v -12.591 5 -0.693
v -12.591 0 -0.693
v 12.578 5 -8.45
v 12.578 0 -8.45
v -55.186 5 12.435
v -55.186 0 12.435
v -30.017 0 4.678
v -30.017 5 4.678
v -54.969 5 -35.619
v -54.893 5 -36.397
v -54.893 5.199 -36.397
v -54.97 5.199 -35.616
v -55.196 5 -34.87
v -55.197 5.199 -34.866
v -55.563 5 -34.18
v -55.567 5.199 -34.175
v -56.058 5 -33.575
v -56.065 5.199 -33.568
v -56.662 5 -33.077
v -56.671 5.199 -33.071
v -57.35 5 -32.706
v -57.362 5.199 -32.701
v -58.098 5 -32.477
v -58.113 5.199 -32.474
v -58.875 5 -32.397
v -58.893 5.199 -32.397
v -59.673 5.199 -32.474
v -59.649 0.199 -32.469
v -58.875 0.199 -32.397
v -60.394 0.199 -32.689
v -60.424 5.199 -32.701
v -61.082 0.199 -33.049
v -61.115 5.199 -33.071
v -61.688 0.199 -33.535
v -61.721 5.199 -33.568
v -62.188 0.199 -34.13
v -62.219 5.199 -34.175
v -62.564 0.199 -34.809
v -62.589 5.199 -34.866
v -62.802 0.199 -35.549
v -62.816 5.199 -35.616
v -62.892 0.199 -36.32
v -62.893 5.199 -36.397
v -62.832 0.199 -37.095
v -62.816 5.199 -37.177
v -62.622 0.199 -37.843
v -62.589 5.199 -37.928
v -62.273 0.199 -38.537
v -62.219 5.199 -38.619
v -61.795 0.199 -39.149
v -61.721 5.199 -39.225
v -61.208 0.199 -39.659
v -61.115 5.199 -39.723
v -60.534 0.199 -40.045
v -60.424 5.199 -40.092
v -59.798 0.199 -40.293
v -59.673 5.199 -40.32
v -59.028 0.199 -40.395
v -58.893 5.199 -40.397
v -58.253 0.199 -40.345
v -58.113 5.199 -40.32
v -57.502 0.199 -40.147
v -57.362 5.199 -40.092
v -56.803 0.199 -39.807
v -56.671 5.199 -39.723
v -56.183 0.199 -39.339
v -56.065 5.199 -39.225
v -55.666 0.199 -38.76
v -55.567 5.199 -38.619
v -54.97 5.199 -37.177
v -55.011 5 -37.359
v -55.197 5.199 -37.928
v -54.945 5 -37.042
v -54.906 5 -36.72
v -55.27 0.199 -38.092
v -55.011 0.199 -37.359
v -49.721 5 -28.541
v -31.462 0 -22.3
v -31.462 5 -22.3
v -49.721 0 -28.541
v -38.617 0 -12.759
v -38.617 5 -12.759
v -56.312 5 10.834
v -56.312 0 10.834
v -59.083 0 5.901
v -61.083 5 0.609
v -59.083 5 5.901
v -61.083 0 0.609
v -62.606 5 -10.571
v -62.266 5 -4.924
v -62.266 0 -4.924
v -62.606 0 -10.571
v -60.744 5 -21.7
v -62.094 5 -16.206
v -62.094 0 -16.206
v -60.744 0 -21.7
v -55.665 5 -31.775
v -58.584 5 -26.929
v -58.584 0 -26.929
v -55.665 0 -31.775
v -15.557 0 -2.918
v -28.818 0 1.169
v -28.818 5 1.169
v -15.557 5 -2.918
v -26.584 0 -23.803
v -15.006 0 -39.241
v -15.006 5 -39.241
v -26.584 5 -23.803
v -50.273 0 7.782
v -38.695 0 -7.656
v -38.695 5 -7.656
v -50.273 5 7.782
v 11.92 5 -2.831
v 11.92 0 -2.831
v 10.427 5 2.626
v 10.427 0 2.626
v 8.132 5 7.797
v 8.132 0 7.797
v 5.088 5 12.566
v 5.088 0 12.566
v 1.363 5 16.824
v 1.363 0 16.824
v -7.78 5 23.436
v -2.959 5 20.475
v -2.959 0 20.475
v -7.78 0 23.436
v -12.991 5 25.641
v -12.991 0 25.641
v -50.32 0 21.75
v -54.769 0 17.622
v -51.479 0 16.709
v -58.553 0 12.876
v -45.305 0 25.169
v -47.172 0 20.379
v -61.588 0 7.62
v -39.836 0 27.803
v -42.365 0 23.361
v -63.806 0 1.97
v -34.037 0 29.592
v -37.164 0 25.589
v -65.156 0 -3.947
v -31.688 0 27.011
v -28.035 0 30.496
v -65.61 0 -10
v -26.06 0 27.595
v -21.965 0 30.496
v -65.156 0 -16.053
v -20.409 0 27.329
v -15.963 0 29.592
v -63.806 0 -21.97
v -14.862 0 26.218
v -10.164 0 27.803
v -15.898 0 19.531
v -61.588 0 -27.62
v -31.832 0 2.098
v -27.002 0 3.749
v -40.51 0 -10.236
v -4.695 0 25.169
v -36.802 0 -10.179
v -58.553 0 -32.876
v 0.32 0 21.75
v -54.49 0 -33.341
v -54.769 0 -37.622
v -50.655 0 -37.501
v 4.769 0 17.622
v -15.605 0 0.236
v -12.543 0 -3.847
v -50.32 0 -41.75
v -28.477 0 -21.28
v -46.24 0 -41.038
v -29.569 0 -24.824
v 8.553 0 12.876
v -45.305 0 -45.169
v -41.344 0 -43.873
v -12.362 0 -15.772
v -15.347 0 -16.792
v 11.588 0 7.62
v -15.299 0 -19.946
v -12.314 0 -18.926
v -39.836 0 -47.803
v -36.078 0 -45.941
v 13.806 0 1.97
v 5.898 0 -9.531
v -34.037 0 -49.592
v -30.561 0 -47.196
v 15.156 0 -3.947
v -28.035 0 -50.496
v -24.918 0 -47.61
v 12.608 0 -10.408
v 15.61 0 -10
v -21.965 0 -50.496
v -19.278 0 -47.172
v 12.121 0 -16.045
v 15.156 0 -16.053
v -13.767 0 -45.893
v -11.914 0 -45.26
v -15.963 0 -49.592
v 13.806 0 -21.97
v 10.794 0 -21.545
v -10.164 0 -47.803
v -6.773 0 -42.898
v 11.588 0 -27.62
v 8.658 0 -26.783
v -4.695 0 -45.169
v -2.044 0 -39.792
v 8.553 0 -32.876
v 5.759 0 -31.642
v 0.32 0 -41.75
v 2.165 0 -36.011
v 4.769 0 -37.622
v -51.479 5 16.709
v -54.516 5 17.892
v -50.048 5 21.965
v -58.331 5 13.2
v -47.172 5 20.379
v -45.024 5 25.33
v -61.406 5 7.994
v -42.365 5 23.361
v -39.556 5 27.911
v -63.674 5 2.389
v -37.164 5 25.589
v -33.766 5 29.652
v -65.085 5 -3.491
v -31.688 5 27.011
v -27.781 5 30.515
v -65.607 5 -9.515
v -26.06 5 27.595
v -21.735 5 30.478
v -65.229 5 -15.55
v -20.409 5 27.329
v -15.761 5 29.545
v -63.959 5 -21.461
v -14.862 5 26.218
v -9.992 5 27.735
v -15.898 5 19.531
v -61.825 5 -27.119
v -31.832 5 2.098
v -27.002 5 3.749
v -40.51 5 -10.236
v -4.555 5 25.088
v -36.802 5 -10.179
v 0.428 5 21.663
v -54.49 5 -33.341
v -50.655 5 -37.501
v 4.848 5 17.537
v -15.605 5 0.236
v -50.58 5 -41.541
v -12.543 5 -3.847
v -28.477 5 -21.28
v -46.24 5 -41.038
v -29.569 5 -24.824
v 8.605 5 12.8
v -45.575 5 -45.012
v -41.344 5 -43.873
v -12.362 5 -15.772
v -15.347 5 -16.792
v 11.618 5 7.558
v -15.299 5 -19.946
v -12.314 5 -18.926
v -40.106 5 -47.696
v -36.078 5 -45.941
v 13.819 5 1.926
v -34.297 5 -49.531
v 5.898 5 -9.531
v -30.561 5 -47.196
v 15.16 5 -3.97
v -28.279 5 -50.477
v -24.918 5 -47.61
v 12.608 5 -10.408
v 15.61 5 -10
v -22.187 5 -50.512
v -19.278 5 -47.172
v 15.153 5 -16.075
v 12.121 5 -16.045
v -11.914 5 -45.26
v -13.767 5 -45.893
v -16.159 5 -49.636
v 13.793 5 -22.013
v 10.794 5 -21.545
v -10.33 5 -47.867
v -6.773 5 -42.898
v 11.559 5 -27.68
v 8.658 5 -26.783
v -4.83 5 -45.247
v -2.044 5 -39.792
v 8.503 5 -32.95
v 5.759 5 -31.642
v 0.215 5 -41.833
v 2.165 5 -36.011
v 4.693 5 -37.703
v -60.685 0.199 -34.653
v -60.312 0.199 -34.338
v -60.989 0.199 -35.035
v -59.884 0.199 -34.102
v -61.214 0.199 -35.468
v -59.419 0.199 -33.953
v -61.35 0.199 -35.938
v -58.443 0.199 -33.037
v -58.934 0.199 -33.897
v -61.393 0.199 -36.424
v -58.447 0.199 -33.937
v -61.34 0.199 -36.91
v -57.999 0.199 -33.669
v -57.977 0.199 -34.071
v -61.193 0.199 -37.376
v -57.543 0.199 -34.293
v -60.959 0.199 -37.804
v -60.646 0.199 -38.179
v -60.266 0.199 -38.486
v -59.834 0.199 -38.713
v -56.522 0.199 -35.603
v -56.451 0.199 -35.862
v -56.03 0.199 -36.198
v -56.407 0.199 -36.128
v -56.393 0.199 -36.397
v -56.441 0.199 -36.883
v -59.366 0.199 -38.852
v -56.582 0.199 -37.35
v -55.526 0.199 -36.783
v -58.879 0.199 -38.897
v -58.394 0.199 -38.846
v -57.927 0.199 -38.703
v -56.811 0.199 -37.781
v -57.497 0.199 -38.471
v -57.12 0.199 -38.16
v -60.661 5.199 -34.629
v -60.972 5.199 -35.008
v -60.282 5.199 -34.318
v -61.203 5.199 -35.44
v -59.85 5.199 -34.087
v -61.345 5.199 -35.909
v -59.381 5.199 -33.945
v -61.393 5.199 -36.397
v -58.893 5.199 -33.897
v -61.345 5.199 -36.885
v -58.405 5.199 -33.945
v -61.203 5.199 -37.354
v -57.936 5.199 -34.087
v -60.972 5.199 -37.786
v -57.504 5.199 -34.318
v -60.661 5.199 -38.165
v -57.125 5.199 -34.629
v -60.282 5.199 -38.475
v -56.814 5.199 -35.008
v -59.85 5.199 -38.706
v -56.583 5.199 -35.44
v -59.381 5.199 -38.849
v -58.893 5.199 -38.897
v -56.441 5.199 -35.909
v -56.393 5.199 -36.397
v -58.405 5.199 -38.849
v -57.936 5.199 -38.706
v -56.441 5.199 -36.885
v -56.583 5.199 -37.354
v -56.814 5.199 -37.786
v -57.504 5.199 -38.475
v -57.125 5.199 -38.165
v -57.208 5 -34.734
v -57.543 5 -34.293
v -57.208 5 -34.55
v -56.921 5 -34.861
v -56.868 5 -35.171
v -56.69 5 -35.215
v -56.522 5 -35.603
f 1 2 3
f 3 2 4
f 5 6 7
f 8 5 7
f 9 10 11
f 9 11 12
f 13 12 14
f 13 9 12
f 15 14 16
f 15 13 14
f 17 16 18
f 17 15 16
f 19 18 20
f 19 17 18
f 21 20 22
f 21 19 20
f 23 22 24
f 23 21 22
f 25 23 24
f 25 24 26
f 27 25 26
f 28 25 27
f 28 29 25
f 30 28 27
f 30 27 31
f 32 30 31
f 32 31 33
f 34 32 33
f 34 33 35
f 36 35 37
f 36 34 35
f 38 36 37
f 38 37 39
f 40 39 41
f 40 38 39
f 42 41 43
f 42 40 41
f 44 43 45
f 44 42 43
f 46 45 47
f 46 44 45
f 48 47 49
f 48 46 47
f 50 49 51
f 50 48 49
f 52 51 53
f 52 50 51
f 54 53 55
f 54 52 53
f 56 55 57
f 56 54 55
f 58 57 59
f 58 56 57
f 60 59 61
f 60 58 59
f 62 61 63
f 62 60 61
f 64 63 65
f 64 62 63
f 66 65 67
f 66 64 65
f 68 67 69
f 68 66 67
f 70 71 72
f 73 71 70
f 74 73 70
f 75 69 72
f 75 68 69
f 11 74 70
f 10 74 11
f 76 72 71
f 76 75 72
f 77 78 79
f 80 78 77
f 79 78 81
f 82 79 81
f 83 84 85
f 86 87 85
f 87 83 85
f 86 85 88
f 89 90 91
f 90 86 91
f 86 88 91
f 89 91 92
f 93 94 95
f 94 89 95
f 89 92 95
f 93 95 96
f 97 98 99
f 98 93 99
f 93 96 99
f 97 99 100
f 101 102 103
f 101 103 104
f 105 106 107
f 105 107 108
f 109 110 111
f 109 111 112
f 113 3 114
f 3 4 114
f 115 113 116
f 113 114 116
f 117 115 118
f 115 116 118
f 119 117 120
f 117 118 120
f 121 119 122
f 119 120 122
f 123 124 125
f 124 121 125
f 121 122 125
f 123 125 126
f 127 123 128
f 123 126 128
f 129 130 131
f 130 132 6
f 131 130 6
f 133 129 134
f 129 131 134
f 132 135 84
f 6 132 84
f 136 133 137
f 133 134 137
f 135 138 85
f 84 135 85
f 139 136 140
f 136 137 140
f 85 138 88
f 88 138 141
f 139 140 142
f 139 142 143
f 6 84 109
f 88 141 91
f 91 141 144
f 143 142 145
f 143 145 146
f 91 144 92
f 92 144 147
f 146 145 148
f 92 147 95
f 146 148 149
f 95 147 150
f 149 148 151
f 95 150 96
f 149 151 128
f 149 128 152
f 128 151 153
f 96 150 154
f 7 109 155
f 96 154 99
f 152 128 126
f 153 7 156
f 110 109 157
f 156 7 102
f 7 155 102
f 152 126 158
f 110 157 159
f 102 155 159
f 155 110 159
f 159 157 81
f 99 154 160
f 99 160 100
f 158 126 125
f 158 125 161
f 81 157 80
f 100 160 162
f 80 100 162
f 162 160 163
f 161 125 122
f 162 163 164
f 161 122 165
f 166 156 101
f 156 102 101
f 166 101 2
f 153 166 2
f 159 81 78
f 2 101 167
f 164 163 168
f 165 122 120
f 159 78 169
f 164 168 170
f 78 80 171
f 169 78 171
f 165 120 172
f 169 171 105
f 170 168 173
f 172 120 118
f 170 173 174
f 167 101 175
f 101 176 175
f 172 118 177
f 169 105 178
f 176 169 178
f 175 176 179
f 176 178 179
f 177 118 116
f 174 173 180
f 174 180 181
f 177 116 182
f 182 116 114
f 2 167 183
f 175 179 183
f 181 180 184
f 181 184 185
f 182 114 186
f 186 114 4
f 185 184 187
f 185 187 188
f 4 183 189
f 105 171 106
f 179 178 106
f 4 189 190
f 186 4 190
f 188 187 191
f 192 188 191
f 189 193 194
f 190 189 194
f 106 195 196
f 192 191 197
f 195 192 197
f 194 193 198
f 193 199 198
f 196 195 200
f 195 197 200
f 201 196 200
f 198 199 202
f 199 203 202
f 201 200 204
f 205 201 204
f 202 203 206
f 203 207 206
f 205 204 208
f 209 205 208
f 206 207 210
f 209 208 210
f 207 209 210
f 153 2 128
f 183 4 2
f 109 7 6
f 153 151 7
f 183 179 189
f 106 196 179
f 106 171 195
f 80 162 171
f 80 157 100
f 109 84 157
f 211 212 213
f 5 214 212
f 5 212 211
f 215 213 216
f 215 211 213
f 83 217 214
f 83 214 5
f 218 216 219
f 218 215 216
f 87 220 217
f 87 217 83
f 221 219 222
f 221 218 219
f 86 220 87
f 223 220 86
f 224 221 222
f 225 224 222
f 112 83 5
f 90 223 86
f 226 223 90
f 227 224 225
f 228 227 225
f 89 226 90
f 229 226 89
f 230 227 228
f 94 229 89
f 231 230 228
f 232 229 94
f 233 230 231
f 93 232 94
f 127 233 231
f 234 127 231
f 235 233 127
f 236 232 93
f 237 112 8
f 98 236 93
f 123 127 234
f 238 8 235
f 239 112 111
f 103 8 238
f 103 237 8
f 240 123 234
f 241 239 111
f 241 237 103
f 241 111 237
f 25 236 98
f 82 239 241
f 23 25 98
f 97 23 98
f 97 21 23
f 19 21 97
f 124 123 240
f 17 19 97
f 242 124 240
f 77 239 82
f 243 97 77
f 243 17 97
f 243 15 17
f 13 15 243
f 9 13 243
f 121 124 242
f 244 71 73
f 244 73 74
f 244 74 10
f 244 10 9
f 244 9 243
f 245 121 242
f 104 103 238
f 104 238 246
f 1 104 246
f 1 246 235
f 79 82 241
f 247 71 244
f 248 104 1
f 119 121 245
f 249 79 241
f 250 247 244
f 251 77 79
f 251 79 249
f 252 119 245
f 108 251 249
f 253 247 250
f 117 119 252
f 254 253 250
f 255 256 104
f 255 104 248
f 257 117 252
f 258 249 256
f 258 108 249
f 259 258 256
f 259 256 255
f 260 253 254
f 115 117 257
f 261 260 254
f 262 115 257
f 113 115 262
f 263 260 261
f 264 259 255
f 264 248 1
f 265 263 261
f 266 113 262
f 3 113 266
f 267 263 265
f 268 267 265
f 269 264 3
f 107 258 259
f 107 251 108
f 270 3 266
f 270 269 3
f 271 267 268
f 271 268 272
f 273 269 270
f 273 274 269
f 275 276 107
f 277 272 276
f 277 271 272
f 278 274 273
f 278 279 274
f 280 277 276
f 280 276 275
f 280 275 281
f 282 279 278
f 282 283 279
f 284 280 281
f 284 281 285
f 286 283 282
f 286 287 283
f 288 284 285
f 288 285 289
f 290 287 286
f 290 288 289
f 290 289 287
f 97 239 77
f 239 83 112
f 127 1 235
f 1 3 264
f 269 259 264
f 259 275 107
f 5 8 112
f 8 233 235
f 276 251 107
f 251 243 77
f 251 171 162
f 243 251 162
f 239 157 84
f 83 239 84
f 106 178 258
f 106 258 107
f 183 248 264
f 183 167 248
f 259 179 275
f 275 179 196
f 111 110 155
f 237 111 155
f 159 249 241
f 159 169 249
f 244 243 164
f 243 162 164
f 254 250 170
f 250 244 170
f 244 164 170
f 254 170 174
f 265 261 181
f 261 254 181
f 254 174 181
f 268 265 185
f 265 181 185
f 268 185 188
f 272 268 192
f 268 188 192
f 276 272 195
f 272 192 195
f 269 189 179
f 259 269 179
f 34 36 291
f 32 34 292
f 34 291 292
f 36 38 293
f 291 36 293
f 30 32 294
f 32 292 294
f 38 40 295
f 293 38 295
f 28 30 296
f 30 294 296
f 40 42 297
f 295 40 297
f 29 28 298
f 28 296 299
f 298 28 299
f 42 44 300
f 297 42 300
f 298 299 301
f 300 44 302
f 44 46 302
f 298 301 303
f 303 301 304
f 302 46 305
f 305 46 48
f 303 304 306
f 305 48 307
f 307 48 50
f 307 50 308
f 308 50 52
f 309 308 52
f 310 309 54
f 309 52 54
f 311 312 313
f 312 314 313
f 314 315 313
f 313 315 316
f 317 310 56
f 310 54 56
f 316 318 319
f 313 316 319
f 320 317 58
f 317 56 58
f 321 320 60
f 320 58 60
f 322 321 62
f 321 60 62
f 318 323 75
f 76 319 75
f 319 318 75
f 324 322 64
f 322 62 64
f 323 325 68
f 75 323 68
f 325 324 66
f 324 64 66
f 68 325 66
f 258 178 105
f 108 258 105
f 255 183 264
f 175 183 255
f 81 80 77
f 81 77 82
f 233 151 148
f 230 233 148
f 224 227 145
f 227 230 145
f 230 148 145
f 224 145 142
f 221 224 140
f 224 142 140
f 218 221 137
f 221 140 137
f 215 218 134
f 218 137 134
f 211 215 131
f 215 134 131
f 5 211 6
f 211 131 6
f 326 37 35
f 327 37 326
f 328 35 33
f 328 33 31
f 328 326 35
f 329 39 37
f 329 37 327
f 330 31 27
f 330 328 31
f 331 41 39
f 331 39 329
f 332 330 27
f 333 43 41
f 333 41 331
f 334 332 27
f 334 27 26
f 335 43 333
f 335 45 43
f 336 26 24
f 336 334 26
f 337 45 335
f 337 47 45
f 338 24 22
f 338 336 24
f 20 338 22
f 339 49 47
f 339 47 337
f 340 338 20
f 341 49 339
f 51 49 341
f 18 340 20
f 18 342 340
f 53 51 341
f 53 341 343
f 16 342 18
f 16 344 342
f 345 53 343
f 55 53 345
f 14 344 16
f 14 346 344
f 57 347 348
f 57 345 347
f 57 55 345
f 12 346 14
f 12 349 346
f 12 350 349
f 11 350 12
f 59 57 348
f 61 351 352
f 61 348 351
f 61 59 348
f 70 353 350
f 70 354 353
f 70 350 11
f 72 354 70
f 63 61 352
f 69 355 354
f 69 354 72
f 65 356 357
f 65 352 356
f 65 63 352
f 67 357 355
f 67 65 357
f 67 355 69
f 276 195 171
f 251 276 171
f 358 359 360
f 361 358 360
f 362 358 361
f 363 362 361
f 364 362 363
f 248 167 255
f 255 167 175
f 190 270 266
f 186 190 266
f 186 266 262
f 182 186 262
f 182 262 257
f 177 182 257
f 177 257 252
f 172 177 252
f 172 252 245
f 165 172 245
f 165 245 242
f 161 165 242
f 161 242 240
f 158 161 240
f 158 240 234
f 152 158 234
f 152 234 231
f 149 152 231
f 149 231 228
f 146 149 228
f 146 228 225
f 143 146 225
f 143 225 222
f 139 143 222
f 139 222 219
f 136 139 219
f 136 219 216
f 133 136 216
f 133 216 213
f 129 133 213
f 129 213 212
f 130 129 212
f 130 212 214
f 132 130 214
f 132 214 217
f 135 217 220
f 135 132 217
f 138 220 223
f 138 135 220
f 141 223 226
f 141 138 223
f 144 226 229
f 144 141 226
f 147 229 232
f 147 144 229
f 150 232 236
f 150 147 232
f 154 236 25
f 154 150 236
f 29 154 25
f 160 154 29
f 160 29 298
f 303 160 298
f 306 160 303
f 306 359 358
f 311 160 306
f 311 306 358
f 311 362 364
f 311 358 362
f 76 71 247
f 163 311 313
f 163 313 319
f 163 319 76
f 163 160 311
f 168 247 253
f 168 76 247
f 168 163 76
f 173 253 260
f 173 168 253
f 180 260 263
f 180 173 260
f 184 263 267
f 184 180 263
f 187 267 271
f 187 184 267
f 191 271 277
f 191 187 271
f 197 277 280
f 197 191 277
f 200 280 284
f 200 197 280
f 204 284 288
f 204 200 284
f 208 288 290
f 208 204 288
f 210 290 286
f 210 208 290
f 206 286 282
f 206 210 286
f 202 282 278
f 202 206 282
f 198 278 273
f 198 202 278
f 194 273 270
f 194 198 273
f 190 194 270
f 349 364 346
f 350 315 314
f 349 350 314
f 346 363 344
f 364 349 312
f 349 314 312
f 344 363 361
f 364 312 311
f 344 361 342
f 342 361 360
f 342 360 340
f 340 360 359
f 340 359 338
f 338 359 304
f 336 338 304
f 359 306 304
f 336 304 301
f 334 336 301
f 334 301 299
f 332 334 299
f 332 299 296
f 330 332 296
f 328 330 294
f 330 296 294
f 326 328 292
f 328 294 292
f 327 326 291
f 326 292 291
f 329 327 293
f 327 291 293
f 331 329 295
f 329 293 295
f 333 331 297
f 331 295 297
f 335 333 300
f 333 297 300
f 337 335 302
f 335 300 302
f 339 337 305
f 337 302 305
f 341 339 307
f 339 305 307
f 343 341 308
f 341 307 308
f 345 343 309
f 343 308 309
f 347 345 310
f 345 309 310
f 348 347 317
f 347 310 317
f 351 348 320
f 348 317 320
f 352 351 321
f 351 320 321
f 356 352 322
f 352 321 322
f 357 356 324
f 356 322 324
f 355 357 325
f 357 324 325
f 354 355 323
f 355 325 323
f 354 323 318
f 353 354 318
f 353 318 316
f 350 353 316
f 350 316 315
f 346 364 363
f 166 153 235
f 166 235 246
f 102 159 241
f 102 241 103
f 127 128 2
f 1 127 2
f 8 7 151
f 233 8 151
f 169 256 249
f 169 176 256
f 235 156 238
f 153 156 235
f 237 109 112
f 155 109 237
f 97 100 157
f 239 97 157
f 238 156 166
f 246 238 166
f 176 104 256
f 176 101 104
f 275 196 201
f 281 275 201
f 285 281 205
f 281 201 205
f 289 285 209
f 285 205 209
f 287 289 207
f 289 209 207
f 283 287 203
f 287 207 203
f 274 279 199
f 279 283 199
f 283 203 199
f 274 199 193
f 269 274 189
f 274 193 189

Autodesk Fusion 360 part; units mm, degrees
sketch "草图1" plane through (0, 0, 0) normal (0, 1, 0) x (1, 0, 0)
  point P0 (-25, 10)
sketch "草图2" plane through (0, 0, 0) normal (0, 1, 0) x (1, 0, 0)
  circle A0 centre (-25, 10) radius 40.6099
  line L0 (-13.7666, 45.8931) -> (-29.5688, 24.8235)
  line L1 (-15.0058, 39.2409) -> (-26.584, 23.8033)
  line L2 (-29.5688, 24.8235) -> (-54.4904, 33.3414)
  line L3 (-31.4615, 22.3) -> (-49.7214, 28.541)
  line L4 (-49.7214, 28.541) -> (-38.6172, 12.759)
  line L5 (-31.4615, 22.3) -> (-38.6172, 12.759)
  line L6 (-40.5098, 10.2355) -> (-56.312, -10.8341)
  line L7 (-55.6651, 31.7752) -> (-40.5098, 10.2355)
  line L8 (-28.4766, 21.2798) -> (-36.802, 10.1792)
  line L9 (-38.6947, 7.6557) -> (-50.2729, -7.7819)
  line L10 (-50.2729, -7.7819) -> (-31.8319, -2.0981)
  line L11 (-38.6947, 7.6557) -> (-31.8319, -2.0981)
  line L12 (-30.0168, -4.6779) -> (-14.8615, -26.2176)
  line L13 (-55.1855, -12.4353) -> (-30.0168, -4.6779)
  line L14 (-36.802, 10.1792) -> (-28.8175, -1.169)
  line L15 (-27.0023, -3.7488) -> (-15.8981, -19.5309)
  line L16 (-15.8981, -19.5309) -> (-15.6052, -0.2361)
  line L17 (-28.8175, -1.169) -> (-15.5573, 2.918)
  line L18 (-12.5428, 3.8471) -> (5.8981, 9.5309)
  line L19 (-12.9906, -25.641) -> (-12.5907, 0.693)
  line L20 (-27.0023, -3.7488) -> (-15.6052, -0.2361)
  line L21 (-12.5907, 0.693) -> (12.578, 8.4504)
  line L22 (5.8981, 9.5309) -> (-12.3618, 15.7719)
  line L23 (-15.3466, 16.7921) -> (-28.4766, 21.2798)
  line L24 (12.6077, 10.408) -> (-12.3139, 18.9259)
  line L25 (-15.2987, 19.9461) -> (-26.584, 23.8033)
  line L26 (-15.5573, 2.918) -> (-15.3466, 16.7921)
  line L27 (-15.2987, 19.9461) -> (-15.0058, 39.2409)
  line L28 (-12.5428, 3.8471) -> (-12.3618, 15.7719)
  line L29 (-12.3139, 18.9259) -> (-11.914, 45.2599)
  arc A1 (-13.7666, 45.8931) -> (-54.4904, 33.3414) centre (-25, 10) ccw
  arc A2 (-55.6651, 31.7752) -> (-56.312, -10.8341) centre (-25, 10) ccw
  arc A3 (-55.1855, -12.4353) -> (-14.8615, -26.2176) centre (-25, 10) ccw
  arc A4 (-12.9906, -25.641) -> (12.578, 8.4504) centre (-25, 10) ccw
  arc A5 (12.6077, 10.408) -> (-11.914, 45.2599) centre (-25, 10) ccw
  point P0 (-15.0058, 39.2409)
  point P1 (-50.2729, -7.7819)
  point P2 (5.8981, 9.5309)
  point P3 (-49.7214, 28.541)
  point P4 (-25, 10)
extrude "拉伸1" add sketch "草图2" along normal blind 5 makes body 1
sketch "草图3" plane through (0, 0, 0) normal (0, 1, 0) x (1, 0, 0)
sketch "草图4" plane through (0, 0, 0) normal (0, 1, 0) x (1, 0, 0)
sketch "草图5" plane through (0, 0, 0) normal (0, 1, 0) x (1, 0, 0)
sketch "草图6" plane through (0, 0, 0) normal (0, 1, 0) x (1, 0, 0)
  circle A0 centre (40, -20) radius 2.5
  circle A1 centre (40, -20) radius 4
  dimension "d5" = 5
  dimension "d6" = 8
extrude "拉伸2" add sketch "草图6" along normal blind 5 separate body makes body 2
move_body "移动1" bodies 2 to x (1, 0, 0) y (0, 1, 0) z (0, 0, 1) at (-108.6235, 0.1986, -28.1984)
move_body "移动2" bodies 2 to x (1, 0, 0) y (0, 1, 0) z (0, 0, 1) at (9.1347, 0, -27.4041)
move_body "移动3" bodies 2 to x (1, 0, 0) y (0, 1, 0) z (0, 0, 1) at (-0.1986, 0, -0.9929)
move_body "移动4" bodies 2 to x (1, 0, 0) y (0, 1, 0) z (0, 0, 1) at (0.3972, 0, 0.7943)
move_body "移动5" bodies 2 to x (1, 0, 0) y (0, 1, 0) z (0, 0, 1) at (0.3972, 0, 0)
move_body "移动6" bodies 2 to x (1, 0, 0) y (0, 1, 0) z (0, 0, 1) at (-0.7943, 0, 0)
move_body "移动7" bodies 2 to x (1, 0, 0) y (0, 1, 0) z (0, 0, 1) at (0.7943, 0, -0.5957)
combine "合并1" operation add target body 1 tool bodies 2
